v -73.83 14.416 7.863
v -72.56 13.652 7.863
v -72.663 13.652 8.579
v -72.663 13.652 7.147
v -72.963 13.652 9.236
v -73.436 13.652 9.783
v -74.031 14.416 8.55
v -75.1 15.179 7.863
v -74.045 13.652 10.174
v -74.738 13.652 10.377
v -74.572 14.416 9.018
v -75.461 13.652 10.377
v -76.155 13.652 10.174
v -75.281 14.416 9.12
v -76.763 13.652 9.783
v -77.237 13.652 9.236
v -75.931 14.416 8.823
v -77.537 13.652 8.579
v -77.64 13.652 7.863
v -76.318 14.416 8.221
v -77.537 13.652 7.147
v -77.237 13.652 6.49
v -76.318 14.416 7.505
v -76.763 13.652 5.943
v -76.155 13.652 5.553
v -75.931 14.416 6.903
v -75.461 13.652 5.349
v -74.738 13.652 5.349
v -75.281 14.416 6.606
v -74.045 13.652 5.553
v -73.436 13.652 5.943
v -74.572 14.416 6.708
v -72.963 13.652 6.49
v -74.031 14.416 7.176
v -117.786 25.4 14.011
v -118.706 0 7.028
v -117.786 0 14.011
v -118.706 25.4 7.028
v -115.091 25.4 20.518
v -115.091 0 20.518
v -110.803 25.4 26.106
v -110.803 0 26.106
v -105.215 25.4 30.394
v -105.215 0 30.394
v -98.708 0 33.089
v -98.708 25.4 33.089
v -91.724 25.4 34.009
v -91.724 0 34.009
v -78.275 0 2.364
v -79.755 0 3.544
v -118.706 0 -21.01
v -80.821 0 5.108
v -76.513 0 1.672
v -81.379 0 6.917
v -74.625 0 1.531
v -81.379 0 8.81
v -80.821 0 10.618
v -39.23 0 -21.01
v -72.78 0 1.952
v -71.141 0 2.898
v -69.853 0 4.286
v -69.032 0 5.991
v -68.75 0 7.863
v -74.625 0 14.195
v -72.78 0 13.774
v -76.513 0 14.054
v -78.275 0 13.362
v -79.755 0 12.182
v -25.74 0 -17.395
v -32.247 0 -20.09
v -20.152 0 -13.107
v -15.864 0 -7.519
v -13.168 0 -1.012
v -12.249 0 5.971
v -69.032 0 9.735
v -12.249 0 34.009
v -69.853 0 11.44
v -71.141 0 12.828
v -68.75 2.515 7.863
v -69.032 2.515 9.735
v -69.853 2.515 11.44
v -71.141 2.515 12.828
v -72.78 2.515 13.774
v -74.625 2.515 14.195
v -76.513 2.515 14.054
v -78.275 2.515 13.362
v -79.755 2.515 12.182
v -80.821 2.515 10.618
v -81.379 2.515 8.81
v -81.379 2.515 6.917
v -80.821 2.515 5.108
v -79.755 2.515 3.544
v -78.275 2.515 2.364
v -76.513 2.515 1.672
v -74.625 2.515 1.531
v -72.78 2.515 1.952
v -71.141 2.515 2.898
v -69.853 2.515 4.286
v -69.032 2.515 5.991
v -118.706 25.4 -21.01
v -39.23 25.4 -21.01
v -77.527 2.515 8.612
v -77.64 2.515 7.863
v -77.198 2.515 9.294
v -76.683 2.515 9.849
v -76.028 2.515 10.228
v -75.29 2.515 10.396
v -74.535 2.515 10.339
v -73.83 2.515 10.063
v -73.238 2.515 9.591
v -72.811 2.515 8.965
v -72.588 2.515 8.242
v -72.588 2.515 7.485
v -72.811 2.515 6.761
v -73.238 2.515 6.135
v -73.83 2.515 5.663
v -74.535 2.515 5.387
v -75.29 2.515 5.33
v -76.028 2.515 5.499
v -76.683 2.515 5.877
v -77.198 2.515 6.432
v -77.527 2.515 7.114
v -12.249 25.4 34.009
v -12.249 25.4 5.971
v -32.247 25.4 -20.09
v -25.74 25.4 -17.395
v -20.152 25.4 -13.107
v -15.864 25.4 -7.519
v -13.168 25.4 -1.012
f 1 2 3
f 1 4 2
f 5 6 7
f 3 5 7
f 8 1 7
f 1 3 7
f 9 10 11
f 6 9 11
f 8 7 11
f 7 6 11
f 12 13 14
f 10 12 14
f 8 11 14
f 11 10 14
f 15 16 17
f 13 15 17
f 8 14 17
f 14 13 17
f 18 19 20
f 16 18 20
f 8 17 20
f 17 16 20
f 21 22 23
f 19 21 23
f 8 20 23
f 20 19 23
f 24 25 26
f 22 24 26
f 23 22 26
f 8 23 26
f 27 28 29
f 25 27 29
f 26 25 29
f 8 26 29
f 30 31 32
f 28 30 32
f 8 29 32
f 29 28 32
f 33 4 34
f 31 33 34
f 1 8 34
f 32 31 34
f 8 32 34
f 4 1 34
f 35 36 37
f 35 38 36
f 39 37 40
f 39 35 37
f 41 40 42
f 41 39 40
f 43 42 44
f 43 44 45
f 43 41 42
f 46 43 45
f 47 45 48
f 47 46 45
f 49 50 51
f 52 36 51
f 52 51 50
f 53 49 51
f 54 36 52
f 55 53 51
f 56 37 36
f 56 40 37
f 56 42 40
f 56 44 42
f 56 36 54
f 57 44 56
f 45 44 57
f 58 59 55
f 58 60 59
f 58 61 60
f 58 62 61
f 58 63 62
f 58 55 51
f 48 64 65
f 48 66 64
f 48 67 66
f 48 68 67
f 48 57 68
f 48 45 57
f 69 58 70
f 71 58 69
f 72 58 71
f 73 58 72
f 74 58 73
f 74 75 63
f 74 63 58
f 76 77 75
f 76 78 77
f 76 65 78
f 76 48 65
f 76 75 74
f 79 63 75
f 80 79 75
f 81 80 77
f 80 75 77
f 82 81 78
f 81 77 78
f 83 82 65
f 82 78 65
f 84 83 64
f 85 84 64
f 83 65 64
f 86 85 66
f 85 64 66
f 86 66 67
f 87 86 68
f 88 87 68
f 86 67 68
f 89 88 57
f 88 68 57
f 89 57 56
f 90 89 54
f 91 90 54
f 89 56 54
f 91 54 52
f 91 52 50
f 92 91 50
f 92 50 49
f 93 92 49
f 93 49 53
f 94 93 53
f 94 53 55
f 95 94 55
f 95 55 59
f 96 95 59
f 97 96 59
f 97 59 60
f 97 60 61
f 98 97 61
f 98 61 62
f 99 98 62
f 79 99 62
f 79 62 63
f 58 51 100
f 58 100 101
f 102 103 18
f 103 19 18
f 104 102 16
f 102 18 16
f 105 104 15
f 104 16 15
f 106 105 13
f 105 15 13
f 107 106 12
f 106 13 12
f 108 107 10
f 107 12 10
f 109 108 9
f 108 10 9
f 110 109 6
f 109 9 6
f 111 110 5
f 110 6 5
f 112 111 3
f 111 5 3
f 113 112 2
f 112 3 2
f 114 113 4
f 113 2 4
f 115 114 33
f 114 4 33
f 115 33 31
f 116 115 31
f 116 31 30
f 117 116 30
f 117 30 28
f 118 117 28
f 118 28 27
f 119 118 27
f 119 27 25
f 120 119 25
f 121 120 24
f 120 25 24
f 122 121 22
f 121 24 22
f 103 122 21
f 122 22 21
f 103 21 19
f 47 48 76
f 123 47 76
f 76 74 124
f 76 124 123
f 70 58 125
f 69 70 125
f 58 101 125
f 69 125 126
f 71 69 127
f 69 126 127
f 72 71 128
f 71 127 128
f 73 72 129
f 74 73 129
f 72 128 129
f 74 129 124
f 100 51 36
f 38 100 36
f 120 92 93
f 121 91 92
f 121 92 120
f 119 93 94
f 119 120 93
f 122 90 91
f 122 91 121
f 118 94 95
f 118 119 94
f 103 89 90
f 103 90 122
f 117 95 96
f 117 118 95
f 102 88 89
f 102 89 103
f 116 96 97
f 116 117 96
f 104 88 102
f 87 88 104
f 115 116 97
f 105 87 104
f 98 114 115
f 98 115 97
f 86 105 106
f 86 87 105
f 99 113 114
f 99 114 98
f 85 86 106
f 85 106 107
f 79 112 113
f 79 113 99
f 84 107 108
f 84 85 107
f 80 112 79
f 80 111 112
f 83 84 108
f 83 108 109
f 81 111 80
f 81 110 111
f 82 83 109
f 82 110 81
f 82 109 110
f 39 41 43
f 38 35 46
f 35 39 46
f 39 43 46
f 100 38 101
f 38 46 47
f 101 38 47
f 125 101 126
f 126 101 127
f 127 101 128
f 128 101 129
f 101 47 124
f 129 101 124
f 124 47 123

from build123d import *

# Parameters (mm, degrees)
F0_W           = 106.4566392452
F0_H           = 55.0185795873
F1_DEPTH       = 25.4
F2_R           = 26.9812507731
F3_D           = 5.08
F3_DEPTH       = 13.6525
F3_CBORE_D     = 12.7
F3_CBORE_DEPTH = 2.5146
F3_TIP         = 1.5261859723


with BuildPart() as f1:
    # F0 (on Front) → F1 (new body)
    with BuildSketch(Plane.XZ):
        with Locations((-65.4772659764, 6.4995298162)):
            Rectangle(F0_W, F0_H)
    extrude(amount=-F1_DEPTH)

    # F2
    f2_edges = [f1.edges().sort_by_distance(p)[0] for p in [
        (-12.248946, 12.7, -21.00976),
        (-118.705586, 12.7, 34.00882),
    ]]
    fillet(f2_edges, radius=F2_R)

    # F3
    with Locations(Plane.XZ):
        with Locations((-75.099773705, 7.8630894423)):
            CounterBoreHole(F3_D / 2, F3_CBORE_D / 2, F3_CBORE_DEPTH, depth=F3_DEPTH)
            with Locations((0, 0, -(F3_DEPTH + F3_TIP / 2))):  # 118° drill point
                Cone(0, F3_D / 2, F3_TIP, mode=Mode.SUBTRACT)


solid = f1.part
